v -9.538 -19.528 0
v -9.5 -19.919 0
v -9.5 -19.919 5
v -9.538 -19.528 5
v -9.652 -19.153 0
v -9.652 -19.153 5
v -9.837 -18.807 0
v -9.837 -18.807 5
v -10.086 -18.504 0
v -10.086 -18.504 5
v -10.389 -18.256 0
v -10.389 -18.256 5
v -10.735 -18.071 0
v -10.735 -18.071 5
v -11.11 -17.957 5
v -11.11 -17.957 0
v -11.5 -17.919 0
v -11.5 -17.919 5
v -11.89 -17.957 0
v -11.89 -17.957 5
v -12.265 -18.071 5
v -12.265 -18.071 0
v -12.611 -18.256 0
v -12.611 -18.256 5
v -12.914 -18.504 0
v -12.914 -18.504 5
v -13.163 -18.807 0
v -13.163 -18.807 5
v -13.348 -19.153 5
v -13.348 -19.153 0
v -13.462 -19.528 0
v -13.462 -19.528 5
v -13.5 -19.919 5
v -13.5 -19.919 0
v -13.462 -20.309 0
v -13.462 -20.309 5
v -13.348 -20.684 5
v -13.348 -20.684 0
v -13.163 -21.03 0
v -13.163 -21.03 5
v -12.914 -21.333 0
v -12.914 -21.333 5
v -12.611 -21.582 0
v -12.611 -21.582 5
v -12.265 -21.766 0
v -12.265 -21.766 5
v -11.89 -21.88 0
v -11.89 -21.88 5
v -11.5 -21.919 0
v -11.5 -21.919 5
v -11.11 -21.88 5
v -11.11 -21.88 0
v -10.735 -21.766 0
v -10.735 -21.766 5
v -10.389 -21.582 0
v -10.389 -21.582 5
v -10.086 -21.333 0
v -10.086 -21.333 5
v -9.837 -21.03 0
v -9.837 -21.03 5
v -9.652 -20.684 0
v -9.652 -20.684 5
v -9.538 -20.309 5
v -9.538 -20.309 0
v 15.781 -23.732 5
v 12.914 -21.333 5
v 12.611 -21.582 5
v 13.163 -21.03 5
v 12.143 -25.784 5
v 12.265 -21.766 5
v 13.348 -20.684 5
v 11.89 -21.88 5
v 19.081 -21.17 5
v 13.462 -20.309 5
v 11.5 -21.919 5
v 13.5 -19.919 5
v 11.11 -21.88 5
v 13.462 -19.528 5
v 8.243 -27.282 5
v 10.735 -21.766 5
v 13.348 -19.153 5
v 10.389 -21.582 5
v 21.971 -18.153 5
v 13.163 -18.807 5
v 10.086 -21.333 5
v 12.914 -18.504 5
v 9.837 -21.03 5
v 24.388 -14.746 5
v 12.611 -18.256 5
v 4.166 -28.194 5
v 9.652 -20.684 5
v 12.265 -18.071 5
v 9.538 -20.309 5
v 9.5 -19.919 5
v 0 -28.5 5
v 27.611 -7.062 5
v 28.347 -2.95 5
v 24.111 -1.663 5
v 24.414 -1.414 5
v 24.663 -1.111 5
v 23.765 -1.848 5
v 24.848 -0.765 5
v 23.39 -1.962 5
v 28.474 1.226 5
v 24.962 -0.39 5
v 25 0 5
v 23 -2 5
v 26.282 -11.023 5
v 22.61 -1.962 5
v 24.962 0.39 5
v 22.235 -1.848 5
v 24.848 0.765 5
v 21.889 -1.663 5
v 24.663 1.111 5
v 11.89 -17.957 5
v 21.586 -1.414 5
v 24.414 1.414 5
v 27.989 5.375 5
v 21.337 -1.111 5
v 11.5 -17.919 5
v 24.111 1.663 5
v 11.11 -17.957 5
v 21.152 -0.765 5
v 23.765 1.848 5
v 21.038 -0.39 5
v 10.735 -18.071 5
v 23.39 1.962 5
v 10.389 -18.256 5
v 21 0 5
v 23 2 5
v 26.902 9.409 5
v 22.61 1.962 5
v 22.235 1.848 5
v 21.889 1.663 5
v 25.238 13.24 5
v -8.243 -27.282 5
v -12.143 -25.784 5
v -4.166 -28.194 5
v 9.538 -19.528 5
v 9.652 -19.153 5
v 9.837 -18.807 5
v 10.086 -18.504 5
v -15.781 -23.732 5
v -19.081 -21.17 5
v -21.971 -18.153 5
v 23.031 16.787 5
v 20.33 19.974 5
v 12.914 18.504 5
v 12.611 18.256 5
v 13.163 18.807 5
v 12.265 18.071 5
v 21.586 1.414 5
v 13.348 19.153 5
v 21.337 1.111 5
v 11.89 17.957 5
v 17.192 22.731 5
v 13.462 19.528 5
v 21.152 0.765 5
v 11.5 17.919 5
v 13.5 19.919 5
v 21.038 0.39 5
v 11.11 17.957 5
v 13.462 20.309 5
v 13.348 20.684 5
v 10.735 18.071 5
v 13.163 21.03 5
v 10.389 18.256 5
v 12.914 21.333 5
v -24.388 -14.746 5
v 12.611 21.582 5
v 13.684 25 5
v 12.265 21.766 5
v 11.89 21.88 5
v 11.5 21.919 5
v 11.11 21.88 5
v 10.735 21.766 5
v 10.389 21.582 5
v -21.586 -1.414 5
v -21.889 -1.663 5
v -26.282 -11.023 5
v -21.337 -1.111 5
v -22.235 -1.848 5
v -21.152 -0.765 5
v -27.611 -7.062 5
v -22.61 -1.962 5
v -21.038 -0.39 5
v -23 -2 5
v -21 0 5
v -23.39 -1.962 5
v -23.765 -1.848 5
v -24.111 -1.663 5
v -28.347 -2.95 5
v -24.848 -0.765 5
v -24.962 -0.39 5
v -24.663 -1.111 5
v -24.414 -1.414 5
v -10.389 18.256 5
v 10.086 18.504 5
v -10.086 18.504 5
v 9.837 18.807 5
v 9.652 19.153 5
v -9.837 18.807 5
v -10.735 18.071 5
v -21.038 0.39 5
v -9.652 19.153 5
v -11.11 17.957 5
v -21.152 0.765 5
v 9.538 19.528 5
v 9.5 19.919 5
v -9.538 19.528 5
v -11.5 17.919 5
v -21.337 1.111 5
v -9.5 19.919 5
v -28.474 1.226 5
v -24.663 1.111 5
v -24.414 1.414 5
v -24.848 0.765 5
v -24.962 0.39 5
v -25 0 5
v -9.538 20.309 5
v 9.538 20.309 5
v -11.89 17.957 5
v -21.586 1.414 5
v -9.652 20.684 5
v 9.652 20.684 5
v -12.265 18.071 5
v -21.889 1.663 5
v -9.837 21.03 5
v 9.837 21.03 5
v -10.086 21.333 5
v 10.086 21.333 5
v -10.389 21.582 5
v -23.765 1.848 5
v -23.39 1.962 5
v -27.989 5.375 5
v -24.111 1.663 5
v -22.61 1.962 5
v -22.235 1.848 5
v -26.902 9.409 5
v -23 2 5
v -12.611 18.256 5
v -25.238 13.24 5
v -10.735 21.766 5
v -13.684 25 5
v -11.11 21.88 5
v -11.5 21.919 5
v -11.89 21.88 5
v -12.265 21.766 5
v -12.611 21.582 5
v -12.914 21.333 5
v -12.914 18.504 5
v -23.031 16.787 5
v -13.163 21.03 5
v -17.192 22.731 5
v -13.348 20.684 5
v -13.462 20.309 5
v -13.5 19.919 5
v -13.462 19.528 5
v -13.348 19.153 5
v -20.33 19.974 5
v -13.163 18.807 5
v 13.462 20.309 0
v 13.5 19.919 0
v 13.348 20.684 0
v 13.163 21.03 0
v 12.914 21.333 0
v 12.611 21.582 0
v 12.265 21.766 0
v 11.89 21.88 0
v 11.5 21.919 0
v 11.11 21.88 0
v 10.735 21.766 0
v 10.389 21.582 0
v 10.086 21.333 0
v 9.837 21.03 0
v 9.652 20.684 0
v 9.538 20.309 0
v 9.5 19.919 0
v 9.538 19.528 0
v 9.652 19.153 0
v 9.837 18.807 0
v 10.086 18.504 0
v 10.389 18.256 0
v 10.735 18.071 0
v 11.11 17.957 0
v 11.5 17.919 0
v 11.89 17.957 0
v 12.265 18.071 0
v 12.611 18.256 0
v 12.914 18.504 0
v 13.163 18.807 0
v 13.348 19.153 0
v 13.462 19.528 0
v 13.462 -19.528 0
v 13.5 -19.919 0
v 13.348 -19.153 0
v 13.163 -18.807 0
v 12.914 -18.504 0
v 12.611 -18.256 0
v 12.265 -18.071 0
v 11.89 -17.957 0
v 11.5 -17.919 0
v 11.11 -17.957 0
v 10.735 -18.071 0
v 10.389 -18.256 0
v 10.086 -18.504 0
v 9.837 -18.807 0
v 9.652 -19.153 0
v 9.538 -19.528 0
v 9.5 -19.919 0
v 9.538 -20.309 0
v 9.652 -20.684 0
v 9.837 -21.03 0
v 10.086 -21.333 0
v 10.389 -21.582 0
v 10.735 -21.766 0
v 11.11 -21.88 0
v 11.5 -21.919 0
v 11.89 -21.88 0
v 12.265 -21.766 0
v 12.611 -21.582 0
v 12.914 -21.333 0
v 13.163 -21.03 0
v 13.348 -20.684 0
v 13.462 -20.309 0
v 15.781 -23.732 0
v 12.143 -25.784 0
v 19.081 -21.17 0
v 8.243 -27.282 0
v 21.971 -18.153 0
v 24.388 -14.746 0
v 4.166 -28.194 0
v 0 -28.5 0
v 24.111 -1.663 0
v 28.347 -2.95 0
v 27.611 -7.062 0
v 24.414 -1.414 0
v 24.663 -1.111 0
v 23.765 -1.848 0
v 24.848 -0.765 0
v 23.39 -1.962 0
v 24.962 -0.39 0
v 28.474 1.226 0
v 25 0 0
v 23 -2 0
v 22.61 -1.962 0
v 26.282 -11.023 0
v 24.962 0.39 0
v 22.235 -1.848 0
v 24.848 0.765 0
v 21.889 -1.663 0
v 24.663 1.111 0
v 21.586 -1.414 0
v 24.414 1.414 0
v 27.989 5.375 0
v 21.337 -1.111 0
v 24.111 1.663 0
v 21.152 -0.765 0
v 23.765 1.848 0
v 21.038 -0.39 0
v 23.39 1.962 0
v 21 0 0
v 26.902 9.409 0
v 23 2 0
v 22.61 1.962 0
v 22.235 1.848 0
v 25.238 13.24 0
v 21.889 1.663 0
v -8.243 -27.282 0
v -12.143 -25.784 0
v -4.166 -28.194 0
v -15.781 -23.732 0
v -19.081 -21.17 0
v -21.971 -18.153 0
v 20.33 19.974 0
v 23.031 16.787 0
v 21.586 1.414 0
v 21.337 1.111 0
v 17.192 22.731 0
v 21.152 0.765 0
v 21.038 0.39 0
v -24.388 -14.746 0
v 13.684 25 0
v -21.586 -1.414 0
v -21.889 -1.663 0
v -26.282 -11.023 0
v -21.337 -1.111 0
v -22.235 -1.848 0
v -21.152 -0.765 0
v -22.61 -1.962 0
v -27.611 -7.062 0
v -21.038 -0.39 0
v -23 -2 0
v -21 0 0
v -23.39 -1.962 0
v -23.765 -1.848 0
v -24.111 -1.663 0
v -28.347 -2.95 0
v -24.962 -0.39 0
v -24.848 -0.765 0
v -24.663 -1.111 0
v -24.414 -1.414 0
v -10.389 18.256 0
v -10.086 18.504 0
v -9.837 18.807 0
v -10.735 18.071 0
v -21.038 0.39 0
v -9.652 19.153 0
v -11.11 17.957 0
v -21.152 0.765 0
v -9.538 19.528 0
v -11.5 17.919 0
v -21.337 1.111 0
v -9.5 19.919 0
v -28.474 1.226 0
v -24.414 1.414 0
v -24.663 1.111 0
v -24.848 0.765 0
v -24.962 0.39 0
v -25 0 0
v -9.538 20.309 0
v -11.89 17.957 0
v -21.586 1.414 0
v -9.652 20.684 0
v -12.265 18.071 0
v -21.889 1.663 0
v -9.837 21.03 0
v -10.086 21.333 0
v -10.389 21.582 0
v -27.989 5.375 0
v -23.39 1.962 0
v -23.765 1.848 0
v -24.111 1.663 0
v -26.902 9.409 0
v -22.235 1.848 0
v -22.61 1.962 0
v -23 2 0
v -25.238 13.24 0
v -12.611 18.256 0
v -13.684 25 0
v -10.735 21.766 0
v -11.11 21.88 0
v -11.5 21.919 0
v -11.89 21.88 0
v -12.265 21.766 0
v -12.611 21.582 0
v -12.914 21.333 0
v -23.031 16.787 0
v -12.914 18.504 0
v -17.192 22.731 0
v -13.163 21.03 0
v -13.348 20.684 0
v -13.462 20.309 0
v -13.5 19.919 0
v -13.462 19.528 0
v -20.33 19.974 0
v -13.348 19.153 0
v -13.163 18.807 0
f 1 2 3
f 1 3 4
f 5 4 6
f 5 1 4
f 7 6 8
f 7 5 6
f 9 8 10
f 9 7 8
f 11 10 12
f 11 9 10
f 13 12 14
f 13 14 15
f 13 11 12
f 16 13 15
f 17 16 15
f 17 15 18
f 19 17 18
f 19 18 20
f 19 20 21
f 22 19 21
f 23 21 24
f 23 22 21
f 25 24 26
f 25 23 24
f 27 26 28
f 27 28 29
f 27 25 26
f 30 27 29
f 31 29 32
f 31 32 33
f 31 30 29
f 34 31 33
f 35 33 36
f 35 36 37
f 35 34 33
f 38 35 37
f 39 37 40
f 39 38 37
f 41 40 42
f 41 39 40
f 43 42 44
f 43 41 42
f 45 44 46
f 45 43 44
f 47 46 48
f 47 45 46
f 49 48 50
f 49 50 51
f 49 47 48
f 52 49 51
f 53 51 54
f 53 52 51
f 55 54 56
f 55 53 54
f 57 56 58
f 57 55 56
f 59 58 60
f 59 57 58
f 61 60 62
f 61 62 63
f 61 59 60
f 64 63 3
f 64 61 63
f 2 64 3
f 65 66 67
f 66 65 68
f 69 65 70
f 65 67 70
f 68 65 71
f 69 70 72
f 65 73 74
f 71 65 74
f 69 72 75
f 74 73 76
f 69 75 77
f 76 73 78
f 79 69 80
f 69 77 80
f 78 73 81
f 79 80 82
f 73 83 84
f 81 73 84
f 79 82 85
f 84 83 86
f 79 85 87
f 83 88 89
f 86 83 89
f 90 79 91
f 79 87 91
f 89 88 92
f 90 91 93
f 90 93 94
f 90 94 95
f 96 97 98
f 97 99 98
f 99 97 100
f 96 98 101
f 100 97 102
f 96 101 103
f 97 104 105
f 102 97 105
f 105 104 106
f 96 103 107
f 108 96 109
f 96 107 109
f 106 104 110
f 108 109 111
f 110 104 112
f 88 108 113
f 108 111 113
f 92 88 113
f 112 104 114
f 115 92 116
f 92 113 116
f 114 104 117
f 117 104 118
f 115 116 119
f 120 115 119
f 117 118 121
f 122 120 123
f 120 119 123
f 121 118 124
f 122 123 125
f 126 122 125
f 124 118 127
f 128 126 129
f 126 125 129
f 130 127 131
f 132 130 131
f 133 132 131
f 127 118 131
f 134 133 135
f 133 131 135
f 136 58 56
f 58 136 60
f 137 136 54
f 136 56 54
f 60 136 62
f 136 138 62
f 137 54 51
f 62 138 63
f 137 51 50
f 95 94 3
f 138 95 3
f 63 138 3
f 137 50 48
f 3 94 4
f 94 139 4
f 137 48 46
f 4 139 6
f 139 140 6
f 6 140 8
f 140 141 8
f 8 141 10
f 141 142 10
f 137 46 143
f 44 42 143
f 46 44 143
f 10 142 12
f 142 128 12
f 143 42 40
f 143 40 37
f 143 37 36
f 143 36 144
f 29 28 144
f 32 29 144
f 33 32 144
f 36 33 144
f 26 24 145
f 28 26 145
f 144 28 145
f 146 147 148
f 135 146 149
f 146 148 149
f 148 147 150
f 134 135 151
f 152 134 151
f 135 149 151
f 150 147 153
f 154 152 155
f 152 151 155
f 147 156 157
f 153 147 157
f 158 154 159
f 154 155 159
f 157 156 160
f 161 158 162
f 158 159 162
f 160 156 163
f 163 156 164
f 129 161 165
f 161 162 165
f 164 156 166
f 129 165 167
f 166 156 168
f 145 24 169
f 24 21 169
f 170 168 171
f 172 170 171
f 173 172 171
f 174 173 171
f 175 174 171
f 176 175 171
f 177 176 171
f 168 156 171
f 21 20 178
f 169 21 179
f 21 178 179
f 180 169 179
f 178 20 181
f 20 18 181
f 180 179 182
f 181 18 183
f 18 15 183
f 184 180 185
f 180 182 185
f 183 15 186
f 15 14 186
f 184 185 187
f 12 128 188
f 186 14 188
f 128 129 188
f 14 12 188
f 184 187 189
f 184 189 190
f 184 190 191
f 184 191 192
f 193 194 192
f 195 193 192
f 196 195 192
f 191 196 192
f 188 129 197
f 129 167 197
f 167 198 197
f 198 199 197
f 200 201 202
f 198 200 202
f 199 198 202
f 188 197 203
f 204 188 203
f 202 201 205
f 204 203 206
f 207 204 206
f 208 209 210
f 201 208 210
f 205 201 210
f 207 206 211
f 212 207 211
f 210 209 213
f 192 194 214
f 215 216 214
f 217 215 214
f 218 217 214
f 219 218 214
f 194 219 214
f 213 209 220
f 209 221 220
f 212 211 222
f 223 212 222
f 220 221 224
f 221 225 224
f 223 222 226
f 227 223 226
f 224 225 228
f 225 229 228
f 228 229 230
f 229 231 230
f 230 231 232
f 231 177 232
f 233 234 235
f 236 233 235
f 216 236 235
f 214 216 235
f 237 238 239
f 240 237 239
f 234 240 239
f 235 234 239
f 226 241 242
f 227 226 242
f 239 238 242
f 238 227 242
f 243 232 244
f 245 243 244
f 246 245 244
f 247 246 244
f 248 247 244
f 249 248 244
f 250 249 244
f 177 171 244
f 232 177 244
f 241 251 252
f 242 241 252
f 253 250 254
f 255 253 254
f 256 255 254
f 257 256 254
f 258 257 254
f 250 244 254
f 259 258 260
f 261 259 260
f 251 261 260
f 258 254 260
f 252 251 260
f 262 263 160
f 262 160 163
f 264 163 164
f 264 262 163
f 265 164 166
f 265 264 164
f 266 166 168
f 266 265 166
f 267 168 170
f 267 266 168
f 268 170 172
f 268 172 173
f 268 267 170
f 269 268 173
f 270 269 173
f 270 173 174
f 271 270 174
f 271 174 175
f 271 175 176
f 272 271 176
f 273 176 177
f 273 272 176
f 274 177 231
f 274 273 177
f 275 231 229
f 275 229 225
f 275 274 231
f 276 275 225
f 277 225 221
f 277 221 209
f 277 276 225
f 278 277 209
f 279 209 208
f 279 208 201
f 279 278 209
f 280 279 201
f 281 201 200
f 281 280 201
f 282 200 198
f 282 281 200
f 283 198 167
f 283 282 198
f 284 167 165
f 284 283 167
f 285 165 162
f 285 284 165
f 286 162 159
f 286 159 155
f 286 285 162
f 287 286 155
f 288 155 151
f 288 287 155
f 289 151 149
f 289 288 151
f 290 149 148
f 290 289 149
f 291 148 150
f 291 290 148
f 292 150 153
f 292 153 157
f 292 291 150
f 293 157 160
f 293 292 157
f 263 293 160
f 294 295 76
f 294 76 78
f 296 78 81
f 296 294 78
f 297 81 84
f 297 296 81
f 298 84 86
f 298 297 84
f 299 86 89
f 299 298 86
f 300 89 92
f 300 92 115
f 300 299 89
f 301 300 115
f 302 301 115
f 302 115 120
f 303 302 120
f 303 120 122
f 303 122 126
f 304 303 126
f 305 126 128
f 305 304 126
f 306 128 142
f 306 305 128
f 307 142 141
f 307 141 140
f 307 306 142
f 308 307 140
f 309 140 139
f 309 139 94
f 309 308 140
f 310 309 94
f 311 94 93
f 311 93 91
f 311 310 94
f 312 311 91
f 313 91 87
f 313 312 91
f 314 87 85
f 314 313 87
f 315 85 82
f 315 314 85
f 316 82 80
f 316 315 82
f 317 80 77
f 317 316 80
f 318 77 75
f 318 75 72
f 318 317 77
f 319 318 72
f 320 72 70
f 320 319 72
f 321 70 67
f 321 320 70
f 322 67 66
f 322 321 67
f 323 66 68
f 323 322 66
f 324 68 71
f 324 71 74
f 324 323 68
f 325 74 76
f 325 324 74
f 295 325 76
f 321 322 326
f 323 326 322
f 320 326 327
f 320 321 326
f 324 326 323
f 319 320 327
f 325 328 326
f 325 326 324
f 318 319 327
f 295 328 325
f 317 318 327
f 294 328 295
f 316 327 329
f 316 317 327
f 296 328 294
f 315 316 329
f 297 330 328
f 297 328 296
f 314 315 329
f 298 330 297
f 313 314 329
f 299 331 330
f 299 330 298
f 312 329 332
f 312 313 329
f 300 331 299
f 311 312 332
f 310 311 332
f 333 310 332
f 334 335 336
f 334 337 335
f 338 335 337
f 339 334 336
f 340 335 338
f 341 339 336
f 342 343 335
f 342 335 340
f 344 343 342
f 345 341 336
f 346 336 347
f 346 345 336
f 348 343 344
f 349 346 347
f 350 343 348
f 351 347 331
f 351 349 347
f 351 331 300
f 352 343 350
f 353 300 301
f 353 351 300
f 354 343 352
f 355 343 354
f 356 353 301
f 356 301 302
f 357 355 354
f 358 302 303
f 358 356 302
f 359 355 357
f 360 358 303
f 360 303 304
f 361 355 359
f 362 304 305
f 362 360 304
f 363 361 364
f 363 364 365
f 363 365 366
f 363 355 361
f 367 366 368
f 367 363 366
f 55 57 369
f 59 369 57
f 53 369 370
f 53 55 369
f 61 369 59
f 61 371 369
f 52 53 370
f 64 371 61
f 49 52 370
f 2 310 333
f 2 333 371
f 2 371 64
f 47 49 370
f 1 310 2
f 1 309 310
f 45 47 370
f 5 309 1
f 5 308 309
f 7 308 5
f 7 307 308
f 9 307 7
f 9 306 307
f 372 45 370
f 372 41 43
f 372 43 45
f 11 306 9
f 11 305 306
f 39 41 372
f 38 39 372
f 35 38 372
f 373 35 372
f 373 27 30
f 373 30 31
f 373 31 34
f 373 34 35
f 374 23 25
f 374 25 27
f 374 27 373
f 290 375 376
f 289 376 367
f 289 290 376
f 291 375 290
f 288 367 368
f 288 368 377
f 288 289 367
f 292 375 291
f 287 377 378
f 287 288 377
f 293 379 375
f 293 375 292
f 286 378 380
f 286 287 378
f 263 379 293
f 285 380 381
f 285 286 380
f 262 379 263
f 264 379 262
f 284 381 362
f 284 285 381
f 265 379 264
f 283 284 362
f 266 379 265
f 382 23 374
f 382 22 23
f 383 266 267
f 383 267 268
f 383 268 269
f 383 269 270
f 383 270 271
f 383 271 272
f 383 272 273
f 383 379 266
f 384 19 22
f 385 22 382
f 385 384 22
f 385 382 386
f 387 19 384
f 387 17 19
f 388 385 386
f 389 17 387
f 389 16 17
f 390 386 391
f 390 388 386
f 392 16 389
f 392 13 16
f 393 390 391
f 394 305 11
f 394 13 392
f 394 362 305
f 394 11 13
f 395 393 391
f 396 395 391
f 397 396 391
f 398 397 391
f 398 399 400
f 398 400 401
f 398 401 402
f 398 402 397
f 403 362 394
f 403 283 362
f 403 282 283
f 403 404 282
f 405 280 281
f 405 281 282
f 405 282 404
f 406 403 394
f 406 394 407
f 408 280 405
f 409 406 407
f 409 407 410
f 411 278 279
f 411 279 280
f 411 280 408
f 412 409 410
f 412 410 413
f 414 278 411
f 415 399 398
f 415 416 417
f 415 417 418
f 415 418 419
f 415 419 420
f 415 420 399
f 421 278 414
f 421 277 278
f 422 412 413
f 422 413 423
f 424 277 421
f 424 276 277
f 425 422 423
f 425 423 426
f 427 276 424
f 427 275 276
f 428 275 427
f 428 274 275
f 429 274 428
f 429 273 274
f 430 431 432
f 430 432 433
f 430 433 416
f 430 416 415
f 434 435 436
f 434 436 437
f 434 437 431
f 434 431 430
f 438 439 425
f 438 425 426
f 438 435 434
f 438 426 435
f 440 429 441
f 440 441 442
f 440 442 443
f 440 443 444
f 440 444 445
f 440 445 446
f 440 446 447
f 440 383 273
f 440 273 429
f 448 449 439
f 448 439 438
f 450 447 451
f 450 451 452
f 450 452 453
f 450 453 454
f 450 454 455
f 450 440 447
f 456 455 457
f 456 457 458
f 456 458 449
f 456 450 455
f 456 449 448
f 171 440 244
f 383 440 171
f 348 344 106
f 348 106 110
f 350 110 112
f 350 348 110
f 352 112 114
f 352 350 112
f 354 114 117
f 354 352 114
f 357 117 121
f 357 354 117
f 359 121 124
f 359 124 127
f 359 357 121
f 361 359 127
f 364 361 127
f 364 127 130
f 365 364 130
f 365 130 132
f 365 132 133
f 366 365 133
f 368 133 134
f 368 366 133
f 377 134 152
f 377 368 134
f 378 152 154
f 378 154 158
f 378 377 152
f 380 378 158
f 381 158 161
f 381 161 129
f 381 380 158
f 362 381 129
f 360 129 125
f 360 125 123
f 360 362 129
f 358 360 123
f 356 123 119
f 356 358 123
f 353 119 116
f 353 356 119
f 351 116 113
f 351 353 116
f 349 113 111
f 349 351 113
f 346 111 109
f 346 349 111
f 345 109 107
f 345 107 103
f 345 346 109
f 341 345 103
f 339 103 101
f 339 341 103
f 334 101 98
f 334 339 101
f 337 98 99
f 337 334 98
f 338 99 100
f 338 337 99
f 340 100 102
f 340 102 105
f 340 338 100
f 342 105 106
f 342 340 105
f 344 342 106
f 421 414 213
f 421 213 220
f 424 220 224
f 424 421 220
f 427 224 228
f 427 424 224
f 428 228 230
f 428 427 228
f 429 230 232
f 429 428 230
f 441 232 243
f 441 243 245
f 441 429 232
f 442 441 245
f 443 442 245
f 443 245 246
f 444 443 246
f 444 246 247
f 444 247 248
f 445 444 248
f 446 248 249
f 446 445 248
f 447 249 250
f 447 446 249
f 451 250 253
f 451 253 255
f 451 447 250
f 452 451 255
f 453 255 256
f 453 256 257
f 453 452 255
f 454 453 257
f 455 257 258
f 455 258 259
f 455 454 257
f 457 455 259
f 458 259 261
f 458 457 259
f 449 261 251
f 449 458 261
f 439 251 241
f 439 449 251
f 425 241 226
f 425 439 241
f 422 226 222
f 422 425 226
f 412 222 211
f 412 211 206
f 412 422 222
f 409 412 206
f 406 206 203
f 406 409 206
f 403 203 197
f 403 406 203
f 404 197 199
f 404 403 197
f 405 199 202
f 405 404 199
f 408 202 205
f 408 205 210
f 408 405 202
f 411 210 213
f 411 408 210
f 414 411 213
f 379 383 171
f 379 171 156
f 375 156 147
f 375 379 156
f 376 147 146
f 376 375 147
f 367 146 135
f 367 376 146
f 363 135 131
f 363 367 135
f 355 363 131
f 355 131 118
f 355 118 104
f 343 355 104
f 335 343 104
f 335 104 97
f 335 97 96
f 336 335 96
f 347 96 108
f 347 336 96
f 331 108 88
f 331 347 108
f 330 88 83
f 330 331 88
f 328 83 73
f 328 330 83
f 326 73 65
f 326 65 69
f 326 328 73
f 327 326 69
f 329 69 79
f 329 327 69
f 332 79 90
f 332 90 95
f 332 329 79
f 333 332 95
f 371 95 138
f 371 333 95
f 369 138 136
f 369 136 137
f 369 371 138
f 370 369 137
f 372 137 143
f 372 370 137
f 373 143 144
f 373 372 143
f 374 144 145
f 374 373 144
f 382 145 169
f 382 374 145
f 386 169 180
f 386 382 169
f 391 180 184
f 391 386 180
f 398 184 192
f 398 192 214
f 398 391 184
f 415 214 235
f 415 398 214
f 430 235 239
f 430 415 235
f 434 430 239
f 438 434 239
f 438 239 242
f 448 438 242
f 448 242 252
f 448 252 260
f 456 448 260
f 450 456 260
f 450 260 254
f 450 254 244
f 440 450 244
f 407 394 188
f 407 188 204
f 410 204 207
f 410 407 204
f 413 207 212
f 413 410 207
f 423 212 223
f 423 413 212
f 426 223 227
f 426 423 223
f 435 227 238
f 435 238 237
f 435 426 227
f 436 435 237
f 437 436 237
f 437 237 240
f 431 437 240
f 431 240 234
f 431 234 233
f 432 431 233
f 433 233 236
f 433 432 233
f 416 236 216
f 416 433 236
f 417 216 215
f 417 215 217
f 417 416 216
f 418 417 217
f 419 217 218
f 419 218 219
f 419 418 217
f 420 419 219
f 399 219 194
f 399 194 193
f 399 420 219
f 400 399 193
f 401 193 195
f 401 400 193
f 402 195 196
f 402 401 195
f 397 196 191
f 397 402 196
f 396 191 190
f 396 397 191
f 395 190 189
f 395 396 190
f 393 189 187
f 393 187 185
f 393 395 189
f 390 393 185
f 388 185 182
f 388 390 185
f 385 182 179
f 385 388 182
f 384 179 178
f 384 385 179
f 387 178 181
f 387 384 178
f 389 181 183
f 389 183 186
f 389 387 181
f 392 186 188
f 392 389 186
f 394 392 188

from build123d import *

# Parameters (mm, degrees)
SKETCH_1_R      = 2
EXTRUDE_1_DEPTH = 5


with BuildPart() as part:
    # 草图1 → 凸台-拉伸1 (new body)
    with BuildSketch(Plane.XY):
        with BuildLine():
            Line((-13.683932183, 25), (13.683932183, 25))
            ThreePointArc((13.683932183, 25), (0, -28.5), (-13.683932183, 25))
        make_face()
        with Locations((23, 0)):
            Circle(SKETCH_1_R, mode=Mode.SUBTRACT)
        with Locations((11.5, -19.918584287)):
            Circle(SKETCH_1_R, mode=Mode.SUBTRACT)
        with Locations((-11.5, -19.918584287)):
            Circle(SKETCH_1_R, mode=Mode.SUBTRACT)
        with Locations((-23, 0)):
            Circle(SKETCH_1_R, mode=Mode.SUBTRACT)
        with Locations((-11.5, 19.918584287)):
            Circle(SKETCH_1_R, mode=Mode.SUBTRACT)
        with Locations((11.5, 19.918584287)):
            Circle(SKETCH_1_R, mode=Mode.SUBTRACT)
    extrude(amount=EXTRUDE_1_DEPTH)


solid = part.part
